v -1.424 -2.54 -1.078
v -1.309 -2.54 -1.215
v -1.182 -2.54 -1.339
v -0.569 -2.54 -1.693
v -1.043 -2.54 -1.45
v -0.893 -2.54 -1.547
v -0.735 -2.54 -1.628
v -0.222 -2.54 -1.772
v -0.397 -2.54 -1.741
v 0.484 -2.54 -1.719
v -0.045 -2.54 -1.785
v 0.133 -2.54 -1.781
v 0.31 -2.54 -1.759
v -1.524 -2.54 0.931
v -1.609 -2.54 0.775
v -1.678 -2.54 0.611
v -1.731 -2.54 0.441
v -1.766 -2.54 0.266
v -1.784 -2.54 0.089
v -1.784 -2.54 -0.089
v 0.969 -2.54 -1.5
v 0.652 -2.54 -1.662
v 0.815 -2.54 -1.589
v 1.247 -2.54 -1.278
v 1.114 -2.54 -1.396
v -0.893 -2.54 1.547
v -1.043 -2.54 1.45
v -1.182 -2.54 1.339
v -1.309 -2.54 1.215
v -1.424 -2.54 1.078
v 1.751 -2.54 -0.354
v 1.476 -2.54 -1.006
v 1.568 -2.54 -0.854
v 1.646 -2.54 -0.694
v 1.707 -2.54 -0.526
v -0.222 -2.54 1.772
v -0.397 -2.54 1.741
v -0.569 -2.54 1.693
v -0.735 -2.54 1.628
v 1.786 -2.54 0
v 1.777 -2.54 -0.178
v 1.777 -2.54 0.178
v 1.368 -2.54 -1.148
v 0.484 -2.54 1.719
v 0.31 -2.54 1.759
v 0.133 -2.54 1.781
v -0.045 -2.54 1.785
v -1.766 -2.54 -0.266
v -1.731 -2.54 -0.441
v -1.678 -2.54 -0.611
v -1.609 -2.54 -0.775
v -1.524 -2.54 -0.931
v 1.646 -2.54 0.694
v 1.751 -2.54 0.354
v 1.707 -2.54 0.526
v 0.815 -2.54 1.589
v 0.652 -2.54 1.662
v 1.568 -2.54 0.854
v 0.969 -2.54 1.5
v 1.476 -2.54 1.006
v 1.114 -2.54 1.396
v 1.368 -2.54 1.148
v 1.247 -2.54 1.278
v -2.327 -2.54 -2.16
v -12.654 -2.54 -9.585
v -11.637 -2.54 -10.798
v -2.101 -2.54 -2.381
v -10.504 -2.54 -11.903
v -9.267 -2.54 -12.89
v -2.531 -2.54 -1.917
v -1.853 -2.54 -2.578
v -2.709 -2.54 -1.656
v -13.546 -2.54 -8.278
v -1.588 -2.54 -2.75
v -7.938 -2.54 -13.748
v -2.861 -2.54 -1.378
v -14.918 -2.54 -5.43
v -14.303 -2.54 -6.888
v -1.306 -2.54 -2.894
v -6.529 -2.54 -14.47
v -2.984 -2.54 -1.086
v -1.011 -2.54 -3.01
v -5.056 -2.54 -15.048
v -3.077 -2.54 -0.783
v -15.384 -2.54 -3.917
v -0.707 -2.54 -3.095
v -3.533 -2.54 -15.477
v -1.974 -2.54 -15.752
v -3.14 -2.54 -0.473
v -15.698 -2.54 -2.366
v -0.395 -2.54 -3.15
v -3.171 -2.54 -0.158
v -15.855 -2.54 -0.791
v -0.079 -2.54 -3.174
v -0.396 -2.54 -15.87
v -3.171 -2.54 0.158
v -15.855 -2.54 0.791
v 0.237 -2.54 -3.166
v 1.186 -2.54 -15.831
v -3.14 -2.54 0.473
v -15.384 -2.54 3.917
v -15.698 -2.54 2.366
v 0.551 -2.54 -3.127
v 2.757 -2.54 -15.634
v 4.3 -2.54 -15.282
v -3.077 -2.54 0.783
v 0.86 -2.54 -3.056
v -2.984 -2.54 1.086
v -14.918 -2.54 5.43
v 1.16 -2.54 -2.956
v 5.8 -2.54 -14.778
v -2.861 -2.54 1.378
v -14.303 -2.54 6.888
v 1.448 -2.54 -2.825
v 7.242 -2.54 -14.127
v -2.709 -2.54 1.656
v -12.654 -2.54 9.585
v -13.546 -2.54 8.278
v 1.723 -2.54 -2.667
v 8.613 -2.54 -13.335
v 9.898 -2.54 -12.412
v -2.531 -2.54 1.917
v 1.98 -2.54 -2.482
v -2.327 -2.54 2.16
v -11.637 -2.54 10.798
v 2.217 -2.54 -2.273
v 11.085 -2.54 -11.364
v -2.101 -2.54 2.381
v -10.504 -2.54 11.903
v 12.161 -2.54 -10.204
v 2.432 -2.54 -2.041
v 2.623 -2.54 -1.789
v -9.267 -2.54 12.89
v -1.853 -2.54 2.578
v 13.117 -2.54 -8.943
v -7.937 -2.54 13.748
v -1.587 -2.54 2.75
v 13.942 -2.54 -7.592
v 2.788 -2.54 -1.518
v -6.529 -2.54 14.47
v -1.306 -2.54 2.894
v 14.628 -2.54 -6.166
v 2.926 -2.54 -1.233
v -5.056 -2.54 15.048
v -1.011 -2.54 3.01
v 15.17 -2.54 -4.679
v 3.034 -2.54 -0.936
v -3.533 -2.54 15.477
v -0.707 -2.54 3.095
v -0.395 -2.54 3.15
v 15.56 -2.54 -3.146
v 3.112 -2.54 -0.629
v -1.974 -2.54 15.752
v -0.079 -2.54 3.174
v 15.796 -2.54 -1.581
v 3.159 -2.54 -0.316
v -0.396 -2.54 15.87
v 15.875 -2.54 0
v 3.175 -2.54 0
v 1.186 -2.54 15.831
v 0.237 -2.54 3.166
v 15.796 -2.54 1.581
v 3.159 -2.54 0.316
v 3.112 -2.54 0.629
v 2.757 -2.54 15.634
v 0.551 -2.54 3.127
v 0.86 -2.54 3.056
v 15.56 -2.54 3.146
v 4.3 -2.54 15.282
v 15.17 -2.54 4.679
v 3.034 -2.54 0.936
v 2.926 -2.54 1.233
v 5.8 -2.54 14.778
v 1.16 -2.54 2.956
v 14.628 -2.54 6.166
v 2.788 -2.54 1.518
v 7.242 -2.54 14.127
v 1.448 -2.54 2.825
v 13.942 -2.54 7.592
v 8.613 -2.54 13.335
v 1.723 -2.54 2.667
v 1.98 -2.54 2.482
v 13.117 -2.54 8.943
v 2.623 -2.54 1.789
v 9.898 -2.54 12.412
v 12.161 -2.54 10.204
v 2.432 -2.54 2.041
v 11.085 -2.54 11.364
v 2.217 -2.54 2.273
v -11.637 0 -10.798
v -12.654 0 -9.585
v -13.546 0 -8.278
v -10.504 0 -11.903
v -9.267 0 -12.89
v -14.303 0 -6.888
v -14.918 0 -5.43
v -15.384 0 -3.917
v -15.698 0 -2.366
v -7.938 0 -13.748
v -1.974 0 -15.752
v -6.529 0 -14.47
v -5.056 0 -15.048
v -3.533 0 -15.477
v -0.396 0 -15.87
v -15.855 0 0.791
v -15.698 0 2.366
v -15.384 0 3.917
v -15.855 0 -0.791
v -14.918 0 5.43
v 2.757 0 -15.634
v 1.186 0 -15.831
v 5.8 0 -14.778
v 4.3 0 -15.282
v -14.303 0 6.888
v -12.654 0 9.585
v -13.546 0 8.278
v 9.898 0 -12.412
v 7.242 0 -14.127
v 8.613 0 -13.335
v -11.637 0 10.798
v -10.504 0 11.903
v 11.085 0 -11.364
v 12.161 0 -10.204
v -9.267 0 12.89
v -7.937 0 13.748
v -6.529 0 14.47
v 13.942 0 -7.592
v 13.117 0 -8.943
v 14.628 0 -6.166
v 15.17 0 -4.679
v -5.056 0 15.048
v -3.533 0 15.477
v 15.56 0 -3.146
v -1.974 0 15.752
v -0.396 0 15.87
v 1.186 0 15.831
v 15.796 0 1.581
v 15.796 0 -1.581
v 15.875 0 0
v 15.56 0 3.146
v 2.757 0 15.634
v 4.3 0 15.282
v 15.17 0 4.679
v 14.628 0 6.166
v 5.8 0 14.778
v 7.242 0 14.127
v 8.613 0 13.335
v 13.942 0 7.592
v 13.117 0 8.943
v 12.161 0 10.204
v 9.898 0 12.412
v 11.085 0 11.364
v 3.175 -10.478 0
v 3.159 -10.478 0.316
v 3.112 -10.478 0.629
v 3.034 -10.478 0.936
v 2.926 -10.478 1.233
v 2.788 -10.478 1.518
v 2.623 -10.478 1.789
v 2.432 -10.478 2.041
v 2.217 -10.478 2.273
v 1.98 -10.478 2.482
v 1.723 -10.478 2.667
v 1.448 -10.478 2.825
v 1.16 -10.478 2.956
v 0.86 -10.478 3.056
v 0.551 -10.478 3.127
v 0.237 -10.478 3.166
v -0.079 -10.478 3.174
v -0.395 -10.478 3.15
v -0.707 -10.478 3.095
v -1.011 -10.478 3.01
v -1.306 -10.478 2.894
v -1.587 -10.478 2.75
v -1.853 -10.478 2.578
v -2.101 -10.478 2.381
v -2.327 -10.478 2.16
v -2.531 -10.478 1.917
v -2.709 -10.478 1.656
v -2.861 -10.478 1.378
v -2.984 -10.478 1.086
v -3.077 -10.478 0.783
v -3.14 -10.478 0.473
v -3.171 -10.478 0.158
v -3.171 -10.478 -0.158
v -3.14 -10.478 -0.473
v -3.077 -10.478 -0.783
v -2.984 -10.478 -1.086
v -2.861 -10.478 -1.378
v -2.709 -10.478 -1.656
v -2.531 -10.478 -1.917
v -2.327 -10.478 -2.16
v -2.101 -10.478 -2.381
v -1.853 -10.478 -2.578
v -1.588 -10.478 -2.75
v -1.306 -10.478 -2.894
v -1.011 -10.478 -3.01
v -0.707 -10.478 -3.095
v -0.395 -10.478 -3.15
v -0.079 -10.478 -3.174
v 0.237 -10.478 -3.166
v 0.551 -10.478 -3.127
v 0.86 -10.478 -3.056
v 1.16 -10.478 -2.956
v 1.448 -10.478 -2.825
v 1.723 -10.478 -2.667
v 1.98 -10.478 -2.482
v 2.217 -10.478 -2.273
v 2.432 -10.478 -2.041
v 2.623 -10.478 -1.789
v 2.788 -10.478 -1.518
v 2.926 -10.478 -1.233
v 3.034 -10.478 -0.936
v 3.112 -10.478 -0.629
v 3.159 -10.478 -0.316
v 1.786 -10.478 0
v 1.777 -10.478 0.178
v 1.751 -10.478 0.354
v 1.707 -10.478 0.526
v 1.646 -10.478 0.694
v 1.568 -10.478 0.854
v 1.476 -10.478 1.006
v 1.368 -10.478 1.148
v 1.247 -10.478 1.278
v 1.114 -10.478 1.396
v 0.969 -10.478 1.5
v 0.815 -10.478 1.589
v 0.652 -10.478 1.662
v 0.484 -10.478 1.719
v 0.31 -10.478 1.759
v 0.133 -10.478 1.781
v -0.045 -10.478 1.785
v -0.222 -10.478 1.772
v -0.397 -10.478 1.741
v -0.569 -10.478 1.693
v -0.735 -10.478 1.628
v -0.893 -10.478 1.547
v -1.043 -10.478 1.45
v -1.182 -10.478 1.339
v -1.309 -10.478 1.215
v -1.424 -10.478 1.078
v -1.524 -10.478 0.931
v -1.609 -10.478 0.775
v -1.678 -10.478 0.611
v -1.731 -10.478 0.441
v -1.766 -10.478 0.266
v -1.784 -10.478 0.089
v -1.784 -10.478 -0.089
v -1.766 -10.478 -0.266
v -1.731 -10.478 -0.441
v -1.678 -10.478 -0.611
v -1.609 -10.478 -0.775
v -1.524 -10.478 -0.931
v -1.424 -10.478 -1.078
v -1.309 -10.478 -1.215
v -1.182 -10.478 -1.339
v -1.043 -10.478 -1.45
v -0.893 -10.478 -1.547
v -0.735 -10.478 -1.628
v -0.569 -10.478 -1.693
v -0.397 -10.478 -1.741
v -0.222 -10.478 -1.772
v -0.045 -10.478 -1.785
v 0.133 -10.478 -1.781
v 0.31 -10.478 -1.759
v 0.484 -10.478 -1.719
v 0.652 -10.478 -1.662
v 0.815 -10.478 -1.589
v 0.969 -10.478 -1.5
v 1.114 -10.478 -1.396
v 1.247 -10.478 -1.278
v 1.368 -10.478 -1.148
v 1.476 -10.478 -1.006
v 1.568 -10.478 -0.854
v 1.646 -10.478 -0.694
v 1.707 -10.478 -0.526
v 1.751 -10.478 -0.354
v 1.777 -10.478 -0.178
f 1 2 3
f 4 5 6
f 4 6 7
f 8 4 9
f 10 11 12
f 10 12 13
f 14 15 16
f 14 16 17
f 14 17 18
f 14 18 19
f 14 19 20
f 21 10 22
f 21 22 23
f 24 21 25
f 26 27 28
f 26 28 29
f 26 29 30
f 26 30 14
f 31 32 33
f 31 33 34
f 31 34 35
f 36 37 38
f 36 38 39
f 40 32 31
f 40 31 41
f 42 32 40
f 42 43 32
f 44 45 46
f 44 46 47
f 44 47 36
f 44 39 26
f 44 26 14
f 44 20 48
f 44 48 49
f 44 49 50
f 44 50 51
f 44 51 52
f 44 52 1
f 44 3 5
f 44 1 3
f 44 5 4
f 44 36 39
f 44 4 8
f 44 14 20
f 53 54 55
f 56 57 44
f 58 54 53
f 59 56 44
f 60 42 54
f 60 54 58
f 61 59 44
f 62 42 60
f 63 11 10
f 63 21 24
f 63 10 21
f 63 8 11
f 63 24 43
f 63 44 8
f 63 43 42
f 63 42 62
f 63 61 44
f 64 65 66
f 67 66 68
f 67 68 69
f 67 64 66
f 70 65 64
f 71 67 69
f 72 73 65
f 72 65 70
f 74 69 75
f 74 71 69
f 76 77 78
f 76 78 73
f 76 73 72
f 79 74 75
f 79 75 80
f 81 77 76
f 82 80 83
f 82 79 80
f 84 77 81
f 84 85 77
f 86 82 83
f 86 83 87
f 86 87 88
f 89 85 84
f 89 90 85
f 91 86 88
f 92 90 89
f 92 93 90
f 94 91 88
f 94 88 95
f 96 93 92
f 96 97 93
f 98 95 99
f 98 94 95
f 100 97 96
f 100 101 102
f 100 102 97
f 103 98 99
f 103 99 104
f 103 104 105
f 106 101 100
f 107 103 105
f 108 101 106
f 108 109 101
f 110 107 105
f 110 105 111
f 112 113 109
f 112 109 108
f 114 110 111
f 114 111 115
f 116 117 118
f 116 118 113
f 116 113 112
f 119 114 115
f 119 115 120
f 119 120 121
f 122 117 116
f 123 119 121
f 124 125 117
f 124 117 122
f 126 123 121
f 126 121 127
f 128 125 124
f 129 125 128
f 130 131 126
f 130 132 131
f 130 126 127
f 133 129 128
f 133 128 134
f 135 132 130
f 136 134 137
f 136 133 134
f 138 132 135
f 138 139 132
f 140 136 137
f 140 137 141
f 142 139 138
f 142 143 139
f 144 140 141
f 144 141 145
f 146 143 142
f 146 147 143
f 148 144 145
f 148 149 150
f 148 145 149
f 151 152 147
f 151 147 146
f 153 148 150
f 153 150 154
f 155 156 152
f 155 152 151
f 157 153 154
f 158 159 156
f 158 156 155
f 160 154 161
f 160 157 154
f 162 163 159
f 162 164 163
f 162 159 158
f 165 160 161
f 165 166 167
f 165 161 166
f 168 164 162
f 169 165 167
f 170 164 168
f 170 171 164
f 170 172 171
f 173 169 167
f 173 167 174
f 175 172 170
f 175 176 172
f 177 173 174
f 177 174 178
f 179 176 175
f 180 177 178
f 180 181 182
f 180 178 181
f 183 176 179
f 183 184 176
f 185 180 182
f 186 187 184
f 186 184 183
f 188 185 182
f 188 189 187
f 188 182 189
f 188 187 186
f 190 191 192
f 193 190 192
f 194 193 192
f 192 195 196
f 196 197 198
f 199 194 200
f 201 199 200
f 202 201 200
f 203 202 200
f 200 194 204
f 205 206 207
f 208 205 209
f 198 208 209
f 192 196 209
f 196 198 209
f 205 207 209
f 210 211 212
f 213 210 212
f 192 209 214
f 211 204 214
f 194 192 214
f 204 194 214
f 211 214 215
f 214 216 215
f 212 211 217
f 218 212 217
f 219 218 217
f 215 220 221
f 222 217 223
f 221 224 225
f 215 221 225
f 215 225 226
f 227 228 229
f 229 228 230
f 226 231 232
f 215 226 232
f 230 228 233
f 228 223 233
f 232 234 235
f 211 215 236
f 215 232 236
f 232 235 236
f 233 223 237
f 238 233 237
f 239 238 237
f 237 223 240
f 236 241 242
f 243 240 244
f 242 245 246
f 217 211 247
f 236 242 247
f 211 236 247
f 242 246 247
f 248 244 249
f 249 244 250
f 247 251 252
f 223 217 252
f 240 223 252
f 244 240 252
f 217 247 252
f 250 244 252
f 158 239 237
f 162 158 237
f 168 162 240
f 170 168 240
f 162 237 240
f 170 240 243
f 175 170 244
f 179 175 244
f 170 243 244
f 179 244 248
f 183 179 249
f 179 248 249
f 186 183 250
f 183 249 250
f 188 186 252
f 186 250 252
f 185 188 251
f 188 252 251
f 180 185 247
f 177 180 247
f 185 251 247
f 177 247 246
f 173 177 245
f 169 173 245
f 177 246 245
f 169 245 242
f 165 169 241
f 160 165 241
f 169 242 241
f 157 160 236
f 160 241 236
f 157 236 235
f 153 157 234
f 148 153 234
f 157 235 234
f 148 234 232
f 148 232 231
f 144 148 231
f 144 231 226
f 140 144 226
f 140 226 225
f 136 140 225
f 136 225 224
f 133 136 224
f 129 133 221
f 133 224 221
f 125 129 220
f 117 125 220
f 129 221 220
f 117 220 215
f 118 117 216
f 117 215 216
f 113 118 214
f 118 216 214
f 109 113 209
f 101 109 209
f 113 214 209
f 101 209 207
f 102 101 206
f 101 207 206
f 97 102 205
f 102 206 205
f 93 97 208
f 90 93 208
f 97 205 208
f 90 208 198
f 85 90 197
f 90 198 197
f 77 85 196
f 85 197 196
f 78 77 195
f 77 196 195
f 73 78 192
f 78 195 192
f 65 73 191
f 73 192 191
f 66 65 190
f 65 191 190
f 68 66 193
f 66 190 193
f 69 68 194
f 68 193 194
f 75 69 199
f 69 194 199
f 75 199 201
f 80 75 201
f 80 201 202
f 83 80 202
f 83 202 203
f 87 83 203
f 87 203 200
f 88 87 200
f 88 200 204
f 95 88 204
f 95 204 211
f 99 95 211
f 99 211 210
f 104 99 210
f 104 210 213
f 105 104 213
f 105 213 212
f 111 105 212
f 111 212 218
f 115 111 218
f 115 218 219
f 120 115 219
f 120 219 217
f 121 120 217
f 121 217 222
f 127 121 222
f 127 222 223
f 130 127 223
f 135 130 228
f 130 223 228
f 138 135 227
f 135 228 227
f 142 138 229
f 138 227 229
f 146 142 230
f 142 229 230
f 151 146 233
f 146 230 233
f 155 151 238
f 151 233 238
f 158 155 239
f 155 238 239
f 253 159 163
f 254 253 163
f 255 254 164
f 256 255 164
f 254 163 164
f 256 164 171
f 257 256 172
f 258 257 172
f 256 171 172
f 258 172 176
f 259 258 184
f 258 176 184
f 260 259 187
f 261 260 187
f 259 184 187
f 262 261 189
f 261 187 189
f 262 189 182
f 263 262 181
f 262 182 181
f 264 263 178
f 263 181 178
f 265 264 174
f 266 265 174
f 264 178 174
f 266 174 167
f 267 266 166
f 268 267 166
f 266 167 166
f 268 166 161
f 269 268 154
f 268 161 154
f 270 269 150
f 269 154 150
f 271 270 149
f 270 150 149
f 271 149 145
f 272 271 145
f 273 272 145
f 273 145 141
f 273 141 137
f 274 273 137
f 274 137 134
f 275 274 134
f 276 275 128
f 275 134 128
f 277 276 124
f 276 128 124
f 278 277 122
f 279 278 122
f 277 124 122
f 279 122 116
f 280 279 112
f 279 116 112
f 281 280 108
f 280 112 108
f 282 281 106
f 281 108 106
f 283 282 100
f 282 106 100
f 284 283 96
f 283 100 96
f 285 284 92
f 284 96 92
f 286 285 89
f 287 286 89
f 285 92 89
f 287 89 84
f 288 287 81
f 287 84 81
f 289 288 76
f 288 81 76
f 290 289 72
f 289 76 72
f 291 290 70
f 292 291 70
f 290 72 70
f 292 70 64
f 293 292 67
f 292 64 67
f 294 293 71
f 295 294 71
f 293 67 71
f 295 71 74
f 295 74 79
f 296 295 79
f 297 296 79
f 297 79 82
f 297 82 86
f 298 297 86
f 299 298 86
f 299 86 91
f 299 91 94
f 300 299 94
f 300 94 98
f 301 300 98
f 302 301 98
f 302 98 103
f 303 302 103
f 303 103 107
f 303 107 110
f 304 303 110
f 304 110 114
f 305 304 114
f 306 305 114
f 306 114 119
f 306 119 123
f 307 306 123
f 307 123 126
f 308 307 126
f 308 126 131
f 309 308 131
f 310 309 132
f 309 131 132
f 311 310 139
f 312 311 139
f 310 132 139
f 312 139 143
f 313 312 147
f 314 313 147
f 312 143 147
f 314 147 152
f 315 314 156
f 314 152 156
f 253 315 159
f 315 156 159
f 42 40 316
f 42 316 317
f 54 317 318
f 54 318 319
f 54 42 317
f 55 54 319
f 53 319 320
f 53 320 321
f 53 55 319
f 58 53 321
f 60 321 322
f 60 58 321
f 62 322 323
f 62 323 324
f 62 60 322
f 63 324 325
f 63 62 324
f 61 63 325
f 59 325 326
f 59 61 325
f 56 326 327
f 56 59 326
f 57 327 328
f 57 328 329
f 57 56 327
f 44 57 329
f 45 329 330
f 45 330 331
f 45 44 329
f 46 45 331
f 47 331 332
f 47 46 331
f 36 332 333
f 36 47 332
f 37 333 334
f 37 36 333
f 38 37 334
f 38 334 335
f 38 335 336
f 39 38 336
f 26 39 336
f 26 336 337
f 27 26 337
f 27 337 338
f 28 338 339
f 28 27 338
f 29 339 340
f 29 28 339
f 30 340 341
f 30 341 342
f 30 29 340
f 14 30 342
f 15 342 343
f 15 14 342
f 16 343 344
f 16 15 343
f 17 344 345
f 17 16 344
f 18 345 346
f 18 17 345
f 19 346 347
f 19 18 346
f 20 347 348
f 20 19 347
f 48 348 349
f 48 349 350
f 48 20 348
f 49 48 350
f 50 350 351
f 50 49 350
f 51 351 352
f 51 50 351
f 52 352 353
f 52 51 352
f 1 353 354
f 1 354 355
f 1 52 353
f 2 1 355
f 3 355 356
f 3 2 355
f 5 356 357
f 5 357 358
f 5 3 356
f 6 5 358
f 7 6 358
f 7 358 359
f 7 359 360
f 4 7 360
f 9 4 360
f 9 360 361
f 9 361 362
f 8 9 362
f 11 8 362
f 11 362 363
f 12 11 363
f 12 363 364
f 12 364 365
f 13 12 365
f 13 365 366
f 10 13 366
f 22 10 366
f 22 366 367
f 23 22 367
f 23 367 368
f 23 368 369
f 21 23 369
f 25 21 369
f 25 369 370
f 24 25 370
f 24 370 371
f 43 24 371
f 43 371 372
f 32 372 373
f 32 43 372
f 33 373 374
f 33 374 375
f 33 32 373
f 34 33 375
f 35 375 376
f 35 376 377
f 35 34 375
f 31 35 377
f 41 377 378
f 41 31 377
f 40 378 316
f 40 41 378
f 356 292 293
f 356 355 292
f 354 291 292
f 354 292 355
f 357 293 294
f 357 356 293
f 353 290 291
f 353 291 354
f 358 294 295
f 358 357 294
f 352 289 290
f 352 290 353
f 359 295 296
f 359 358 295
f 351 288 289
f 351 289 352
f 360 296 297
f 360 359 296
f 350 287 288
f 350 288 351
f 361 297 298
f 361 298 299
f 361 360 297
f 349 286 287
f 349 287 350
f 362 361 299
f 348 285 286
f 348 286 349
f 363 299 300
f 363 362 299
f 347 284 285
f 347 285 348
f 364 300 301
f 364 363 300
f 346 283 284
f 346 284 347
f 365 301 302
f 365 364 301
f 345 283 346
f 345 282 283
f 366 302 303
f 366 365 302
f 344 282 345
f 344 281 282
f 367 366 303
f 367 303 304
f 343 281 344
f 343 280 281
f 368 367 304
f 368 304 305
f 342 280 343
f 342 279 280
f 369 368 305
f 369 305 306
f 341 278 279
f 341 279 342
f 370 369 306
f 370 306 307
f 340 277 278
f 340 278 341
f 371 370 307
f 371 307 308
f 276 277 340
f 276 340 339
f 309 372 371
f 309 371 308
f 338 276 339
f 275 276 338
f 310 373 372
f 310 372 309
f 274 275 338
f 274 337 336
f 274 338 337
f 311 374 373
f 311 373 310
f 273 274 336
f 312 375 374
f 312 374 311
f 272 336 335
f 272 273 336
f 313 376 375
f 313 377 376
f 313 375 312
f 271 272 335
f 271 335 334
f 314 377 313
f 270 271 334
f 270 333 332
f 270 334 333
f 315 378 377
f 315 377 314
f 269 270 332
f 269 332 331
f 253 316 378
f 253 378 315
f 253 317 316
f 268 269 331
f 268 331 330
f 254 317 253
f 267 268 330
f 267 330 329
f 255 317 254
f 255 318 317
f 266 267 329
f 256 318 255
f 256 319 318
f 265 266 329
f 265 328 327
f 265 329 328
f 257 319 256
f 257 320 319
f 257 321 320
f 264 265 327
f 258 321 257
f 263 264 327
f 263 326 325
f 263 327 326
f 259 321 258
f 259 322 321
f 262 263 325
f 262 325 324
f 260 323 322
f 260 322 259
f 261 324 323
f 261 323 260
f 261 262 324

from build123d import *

# Parameters (mm, degrees)
F0_R     = 15.875
F1_DEPTH = 2.54
F2_R     = 3.175
F2_R_2   = 1.785938
F3_DEPTH = 7.9375


with BuildPart() as f1:
    # F0 (on Front) → F1 (new body)
    with BuildSketch(Plane.XZ):
        Circle(F0_R)
    extrude(amount=F1_DEPTH)

    # F2 (on face) → F3 (join)
    with BuildSketch(Plane.XZ.offset(2.54)):
        Circle(F2_R)
        Circle(F2_R_2, mode=Mode.SUBTRACT)
    extrude(amount=F3_DEPTH)


solid = f1.part
